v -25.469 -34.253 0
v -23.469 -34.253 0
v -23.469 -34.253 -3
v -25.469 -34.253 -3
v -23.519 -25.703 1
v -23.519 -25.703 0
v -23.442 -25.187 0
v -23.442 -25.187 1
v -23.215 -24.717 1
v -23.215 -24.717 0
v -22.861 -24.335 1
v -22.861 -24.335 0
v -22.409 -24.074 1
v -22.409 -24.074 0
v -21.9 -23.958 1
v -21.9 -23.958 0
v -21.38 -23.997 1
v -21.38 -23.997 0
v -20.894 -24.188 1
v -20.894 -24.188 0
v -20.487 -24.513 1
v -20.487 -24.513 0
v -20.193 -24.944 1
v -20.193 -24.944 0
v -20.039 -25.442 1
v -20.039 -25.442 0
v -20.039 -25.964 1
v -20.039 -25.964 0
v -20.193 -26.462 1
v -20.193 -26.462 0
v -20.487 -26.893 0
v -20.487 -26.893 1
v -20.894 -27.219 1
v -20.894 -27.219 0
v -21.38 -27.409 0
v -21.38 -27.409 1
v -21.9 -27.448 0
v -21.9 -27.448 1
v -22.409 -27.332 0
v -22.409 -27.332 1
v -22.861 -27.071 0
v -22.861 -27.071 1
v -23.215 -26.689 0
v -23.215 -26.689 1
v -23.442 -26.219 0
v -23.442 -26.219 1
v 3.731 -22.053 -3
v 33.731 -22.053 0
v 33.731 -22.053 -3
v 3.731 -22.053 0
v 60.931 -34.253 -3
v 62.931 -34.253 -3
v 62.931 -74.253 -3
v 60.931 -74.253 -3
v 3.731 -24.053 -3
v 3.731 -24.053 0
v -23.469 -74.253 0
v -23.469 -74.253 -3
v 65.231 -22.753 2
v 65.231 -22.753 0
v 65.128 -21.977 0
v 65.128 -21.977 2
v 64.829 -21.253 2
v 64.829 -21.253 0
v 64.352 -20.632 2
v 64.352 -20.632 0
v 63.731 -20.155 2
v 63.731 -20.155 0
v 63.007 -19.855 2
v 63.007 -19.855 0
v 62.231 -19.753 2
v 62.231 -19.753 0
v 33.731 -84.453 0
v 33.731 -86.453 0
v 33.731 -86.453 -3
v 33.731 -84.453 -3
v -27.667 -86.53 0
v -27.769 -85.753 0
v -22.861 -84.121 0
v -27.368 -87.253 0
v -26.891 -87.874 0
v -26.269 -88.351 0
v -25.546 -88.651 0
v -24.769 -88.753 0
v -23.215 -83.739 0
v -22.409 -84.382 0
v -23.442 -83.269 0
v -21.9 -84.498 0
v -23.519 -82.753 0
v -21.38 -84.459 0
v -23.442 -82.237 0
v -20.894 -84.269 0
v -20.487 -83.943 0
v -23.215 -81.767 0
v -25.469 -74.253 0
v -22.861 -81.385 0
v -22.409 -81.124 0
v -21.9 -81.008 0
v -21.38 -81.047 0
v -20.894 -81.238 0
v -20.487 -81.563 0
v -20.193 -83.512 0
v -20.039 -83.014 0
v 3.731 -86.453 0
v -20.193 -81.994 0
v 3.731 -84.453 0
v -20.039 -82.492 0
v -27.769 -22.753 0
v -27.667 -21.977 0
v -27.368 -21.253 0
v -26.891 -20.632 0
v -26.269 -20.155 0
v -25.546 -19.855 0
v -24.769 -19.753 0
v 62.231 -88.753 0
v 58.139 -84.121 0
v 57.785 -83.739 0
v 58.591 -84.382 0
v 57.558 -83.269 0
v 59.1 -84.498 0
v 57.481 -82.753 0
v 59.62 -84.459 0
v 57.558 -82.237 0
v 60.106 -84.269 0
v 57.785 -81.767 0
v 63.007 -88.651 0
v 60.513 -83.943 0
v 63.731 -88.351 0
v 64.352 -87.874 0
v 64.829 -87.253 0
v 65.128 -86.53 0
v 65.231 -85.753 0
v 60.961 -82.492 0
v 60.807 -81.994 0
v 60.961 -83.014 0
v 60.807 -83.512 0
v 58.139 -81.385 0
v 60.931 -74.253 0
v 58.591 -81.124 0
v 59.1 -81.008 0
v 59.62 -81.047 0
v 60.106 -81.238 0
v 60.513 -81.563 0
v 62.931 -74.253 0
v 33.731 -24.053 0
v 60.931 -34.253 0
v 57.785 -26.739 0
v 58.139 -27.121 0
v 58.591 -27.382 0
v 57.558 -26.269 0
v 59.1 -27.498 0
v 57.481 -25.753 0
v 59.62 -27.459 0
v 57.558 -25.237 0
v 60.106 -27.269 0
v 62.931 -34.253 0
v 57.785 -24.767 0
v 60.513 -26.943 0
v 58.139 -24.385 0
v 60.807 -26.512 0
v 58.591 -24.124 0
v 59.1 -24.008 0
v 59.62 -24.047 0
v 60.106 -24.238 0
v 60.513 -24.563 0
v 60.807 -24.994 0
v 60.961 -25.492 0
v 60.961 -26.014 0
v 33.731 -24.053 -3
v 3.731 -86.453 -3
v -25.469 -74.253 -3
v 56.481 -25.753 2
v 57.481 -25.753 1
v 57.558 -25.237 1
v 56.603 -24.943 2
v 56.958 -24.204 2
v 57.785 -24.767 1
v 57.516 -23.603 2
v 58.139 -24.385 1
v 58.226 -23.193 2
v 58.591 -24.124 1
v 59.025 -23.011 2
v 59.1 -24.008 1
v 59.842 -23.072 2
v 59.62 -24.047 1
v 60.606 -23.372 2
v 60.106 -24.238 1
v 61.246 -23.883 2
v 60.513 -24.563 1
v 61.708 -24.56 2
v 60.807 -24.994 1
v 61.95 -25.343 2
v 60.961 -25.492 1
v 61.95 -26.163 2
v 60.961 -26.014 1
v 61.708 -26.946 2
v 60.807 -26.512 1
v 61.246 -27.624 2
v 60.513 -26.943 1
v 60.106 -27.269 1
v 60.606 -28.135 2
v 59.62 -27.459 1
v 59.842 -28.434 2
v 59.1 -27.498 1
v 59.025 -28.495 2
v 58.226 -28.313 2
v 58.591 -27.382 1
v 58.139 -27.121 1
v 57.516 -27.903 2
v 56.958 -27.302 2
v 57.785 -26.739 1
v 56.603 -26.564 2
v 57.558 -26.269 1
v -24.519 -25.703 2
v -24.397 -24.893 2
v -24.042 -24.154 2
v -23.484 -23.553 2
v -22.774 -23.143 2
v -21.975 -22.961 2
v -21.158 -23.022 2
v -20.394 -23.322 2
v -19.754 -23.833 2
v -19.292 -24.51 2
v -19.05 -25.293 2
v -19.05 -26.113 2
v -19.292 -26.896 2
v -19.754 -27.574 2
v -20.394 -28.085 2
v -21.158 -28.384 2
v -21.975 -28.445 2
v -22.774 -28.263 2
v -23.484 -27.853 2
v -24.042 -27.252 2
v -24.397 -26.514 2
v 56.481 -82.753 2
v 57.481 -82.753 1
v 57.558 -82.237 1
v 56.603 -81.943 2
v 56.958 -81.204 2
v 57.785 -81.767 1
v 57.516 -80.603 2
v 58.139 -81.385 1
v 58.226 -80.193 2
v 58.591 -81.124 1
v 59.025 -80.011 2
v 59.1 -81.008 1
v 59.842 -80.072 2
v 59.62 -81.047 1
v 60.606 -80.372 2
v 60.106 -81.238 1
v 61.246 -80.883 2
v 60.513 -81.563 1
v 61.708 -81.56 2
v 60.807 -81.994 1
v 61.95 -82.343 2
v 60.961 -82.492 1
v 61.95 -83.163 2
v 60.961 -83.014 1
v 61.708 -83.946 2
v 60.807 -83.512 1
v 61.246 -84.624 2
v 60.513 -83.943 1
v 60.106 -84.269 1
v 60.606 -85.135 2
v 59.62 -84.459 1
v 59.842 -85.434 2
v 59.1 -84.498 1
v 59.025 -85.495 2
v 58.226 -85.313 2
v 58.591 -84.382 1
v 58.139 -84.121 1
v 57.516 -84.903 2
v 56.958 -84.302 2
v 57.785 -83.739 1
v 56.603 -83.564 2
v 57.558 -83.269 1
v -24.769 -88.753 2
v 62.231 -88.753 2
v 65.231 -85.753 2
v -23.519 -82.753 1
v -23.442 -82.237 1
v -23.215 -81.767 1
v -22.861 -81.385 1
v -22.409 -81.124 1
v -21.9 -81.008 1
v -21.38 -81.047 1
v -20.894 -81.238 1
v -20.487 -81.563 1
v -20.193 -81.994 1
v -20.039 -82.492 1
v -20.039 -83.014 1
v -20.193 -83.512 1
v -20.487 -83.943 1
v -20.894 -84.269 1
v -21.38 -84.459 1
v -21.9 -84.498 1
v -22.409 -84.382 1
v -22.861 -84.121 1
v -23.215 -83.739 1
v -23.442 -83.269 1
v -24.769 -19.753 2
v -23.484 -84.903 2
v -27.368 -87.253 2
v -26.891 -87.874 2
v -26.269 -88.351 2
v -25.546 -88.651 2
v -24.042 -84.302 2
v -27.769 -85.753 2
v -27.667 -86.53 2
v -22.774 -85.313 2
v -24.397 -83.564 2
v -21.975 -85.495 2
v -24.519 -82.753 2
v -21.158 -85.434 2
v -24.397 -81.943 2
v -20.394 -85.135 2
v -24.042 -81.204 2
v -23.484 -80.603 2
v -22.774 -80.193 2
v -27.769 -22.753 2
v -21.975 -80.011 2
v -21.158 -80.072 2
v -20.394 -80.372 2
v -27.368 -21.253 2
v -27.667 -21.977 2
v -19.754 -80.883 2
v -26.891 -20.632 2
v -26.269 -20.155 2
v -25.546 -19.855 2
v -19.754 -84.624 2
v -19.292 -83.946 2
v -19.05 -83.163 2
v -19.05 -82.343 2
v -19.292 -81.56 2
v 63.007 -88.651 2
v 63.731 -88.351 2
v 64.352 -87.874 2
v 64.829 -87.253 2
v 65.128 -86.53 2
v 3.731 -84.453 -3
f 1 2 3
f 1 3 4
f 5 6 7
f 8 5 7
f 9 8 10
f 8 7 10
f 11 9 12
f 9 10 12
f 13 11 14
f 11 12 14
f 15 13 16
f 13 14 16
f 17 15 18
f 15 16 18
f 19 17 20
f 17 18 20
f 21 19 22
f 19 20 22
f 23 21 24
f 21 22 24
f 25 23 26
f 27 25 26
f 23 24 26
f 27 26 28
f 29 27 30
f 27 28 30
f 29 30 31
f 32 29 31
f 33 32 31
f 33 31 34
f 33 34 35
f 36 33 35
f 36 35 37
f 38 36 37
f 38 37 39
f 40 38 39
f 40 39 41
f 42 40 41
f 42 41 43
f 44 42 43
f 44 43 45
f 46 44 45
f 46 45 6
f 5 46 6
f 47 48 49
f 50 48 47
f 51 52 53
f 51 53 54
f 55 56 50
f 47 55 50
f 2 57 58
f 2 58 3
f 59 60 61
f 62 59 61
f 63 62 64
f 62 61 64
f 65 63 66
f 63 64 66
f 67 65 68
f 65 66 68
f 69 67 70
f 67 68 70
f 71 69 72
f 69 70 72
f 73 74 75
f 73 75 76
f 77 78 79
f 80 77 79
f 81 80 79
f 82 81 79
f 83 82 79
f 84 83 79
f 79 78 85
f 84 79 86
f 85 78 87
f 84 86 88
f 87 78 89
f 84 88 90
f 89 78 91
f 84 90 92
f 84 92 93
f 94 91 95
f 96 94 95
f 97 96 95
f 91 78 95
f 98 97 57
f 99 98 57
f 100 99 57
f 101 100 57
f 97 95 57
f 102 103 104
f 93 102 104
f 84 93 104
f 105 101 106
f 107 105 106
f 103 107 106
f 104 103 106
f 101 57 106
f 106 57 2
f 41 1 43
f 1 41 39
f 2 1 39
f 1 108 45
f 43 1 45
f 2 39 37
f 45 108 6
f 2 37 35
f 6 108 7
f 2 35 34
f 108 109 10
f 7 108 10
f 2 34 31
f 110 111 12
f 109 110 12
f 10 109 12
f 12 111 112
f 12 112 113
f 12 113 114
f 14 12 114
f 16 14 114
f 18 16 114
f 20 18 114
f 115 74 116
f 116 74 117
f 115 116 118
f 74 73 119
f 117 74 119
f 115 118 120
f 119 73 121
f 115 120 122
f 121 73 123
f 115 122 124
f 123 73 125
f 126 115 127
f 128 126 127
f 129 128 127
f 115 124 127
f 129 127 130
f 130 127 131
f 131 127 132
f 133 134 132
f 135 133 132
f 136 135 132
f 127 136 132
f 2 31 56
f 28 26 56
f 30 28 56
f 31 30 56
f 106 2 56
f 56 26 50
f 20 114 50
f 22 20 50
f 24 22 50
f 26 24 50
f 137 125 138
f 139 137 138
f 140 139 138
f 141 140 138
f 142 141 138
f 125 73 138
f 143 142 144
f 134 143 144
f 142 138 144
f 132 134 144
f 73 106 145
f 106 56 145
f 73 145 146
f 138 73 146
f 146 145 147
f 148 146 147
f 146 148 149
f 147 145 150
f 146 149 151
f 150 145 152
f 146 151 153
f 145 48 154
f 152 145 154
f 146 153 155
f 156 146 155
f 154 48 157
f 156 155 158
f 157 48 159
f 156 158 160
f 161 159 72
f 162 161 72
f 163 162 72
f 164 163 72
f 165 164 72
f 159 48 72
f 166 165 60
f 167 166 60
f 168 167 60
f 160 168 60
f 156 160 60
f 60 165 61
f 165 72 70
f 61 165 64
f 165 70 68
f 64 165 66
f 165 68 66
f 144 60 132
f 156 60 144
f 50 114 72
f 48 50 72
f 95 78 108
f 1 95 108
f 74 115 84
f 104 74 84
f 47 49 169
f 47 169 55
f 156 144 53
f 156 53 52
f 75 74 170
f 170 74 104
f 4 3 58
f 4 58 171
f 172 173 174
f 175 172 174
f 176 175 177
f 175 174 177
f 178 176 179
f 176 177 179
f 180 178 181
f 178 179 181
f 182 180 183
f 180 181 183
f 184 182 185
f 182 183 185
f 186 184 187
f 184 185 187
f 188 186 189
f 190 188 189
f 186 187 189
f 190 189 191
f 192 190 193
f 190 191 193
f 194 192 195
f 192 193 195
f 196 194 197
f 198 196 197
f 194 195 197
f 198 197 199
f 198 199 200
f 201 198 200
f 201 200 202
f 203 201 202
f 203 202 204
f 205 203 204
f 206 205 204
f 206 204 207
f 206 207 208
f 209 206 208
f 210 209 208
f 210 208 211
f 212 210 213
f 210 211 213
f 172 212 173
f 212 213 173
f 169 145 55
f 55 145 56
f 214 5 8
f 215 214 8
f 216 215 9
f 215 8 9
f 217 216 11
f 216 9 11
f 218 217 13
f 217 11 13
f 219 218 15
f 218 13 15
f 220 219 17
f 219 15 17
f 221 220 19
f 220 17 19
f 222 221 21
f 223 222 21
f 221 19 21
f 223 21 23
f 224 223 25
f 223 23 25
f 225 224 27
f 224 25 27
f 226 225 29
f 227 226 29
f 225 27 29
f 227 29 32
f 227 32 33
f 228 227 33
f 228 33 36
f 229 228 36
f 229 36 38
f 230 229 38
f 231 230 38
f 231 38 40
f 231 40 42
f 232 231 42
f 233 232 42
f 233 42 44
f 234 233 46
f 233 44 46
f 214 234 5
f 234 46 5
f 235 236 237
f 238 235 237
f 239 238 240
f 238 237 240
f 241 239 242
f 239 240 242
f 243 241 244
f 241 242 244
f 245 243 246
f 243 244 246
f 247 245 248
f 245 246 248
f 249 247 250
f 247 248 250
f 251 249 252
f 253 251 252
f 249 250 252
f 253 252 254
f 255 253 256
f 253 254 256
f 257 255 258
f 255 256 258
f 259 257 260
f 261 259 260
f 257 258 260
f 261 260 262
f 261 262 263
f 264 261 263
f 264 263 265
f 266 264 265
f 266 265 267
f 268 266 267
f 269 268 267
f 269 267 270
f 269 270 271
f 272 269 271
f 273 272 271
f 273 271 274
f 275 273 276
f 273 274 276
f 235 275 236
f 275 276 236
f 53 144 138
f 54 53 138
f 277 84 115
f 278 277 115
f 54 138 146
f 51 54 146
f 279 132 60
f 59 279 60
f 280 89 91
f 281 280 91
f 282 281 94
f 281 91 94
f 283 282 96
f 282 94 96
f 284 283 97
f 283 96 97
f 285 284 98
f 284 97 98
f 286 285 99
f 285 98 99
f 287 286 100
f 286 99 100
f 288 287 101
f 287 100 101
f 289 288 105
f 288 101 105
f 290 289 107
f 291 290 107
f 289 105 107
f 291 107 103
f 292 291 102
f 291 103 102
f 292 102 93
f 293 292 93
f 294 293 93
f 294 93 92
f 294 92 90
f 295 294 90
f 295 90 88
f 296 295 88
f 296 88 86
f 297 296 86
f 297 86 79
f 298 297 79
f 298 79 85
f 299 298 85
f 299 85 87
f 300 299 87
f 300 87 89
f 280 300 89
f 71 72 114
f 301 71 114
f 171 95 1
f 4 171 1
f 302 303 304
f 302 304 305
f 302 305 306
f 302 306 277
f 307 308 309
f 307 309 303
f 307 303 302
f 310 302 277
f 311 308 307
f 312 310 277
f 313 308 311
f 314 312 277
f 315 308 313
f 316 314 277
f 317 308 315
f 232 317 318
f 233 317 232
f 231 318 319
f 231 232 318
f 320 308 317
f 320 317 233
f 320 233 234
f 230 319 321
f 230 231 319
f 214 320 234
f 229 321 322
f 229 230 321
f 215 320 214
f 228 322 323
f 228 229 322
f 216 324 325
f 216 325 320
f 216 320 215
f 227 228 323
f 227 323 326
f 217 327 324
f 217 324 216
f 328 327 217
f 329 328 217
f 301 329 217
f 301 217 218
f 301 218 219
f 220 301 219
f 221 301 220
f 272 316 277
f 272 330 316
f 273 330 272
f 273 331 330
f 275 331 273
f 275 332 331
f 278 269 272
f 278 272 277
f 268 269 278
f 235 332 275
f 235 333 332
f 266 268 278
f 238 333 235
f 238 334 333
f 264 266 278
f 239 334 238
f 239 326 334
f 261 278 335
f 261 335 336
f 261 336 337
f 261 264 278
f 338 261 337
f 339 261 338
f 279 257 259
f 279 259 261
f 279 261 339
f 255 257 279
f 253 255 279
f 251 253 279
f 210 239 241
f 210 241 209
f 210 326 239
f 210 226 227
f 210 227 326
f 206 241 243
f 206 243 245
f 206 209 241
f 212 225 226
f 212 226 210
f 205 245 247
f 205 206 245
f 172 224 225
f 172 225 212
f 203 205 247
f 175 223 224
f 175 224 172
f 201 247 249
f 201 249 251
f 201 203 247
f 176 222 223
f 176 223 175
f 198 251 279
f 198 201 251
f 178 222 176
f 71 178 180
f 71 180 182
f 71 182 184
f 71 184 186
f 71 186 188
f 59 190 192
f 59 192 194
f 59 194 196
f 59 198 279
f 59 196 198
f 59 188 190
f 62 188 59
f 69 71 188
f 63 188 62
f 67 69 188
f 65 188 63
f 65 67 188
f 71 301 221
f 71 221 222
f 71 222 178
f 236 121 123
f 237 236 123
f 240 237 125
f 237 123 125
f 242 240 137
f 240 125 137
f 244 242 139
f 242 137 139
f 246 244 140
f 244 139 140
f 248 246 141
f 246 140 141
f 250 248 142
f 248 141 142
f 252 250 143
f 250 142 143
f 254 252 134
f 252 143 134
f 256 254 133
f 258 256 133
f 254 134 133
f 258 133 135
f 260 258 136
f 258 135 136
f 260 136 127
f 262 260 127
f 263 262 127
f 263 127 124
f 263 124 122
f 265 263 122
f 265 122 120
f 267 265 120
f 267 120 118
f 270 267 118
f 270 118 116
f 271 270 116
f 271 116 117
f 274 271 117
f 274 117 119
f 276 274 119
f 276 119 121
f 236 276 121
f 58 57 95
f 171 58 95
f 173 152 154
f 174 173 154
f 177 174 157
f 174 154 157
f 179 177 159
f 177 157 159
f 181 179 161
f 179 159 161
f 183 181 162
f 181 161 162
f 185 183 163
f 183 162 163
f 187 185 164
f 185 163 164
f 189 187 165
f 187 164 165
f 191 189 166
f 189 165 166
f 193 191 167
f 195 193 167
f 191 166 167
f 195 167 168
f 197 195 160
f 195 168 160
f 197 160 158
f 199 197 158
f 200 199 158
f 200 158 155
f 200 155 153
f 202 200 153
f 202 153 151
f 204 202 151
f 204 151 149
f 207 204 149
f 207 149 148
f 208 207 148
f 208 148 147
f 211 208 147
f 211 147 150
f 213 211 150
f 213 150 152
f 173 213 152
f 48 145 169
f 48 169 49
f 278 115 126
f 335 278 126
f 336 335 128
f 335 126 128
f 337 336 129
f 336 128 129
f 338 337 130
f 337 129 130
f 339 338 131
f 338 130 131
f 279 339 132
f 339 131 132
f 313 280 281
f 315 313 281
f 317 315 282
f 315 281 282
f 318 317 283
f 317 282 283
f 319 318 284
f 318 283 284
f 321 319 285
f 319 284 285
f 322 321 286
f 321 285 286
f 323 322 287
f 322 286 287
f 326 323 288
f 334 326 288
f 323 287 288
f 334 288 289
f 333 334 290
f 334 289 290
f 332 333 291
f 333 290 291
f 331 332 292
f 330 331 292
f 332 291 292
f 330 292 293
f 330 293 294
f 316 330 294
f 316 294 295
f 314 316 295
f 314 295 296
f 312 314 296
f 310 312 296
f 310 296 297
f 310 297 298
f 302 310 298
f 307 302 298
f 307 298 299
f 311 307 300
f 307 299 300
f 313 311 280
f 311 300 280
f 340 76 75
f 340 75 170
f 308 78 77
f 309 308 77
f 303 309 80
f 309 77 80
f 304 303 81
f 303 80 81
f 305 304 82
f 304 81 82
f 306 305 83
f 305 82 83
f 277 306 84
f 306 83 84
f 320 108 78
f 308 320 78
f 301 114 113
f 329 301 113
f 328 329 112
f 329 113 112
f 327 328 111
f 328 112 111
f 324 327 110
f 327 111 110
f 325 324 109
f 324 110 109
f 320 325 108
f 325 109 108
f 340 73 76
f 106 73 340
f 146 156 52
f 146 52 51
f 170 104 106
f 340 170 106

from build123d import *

# Parameters (mm, degrees)
BOSS_EXTRUDE1_DEPTH = 2
SKETCH3_W           = 2
SKETCH3_H           = 40
SKETCH3_W_2         = 30
SKETCH3_H_2         = 2
BOSS_EXTRUDE2_DEPTH = 3
SKETCH4_R           = 1.75
CUT_EXTRUDE1_DEPTH  = 3
CHAMFER1_SIZE       = 1


with BuildPart() as part:
    # Sketch1 → Boss-Extrude1 (new body)
    with BuildSketch(Plane.XY):
        with BuildLine():
            Line((65.230528188, -85.753133266), (65.230528188, -22.753132266))
            ThreePointArc((65.230528188, -22.753132266), (64.351848531, -20.631811922), (62.230528188, -19.753132266))
            Line((62.230528188, -19.753132266), (-24.769470492, -19.753132266))
            ThreePointArc((-24.769470492, -19.753132266), (-26.890790836, -20.631811922), (-27.769470492, -22.753132266))
            Line((-27.769470492, -22.753132266), (-27.769470492, -85.753133266))
            ThreePointArc((-27.769470492, -85.753133266), (-26.890790836, -87.874453609), (-24.769470492, -88.753133266))
            Line((-24.769470492, -88.753133266), (62.230528188, -88.753133266))
            ThreePointArc((62.230528188, -88.753133266), (64.351848531, -87.874453609), (65.230528188, -85.753133266))
        make_face()
    extrude(amount=BOSS_EXTRUDE1_DEPTH)

    # Sketch3 → Boss-Extrude2 (add)
    with BuildSketch(Plane(origin=(0, 0, 0), x_dir=(-1, 0, 0), z_dir=(0, 0, -1))):
        with Locations((-61.930528188, -54.253132766)):
            Rectangle(SKETCH3_W, SKETCH3_H)
        with Locations((24.469470492, -54.253132766)):
            Rectangle(SKETCH3_W, SKETCH3_H)
        with Locations((-18.730528848, -23.053132266)):
            Rectangle(SKETCH3_W_2, SKETCH3_H_2)
        with Locations((-18.730528848, -85.453133266)):
            Rectangle(SKETCH3_W_2, SKETCH3_H_2)
    extrude(amount=BOSS_EXTRUDE2_DEPTH)

    # Sketch4 → Cut-Extrude1 (cut)
    with BuildSketch(Plane(origin=(0, 0, 0), x_dir=(-1, 0, 0), z_dir=(0, 0, -1))):
        with Locations((-59.230528188, -25.753132266)):
            Circle(SKETCH4_R)
        with Locations((21.769470706, -25.703133912)):
            Circle(SKETCH4_R)
        with Locations((21.769470492, -82.753133266)):
            Circle(SKETCH4_R)
        with Locations((-59.230528188, -82.753133266)):
            Circle(SKETCH4_R)
    extrude(amount=-CUT_EXTRUDE1_DEPTH, mode=Mode.SUBTRACT)

    # Chamfer1
    chamfer1_edges = [part.edges().sort_by_distance(p)[0] for p in [
        (60.980528188, -82.753133266, 2),
        (-20.019470492, -82.753133266, 2),
        (-20.019470706, -25.703133912, 2),
        (60.980528188, -25.753132266, 2),
    ]]
    chamfer(chamfer1_edges, length=CHAMFER1_SIZE)


solid = part.part
